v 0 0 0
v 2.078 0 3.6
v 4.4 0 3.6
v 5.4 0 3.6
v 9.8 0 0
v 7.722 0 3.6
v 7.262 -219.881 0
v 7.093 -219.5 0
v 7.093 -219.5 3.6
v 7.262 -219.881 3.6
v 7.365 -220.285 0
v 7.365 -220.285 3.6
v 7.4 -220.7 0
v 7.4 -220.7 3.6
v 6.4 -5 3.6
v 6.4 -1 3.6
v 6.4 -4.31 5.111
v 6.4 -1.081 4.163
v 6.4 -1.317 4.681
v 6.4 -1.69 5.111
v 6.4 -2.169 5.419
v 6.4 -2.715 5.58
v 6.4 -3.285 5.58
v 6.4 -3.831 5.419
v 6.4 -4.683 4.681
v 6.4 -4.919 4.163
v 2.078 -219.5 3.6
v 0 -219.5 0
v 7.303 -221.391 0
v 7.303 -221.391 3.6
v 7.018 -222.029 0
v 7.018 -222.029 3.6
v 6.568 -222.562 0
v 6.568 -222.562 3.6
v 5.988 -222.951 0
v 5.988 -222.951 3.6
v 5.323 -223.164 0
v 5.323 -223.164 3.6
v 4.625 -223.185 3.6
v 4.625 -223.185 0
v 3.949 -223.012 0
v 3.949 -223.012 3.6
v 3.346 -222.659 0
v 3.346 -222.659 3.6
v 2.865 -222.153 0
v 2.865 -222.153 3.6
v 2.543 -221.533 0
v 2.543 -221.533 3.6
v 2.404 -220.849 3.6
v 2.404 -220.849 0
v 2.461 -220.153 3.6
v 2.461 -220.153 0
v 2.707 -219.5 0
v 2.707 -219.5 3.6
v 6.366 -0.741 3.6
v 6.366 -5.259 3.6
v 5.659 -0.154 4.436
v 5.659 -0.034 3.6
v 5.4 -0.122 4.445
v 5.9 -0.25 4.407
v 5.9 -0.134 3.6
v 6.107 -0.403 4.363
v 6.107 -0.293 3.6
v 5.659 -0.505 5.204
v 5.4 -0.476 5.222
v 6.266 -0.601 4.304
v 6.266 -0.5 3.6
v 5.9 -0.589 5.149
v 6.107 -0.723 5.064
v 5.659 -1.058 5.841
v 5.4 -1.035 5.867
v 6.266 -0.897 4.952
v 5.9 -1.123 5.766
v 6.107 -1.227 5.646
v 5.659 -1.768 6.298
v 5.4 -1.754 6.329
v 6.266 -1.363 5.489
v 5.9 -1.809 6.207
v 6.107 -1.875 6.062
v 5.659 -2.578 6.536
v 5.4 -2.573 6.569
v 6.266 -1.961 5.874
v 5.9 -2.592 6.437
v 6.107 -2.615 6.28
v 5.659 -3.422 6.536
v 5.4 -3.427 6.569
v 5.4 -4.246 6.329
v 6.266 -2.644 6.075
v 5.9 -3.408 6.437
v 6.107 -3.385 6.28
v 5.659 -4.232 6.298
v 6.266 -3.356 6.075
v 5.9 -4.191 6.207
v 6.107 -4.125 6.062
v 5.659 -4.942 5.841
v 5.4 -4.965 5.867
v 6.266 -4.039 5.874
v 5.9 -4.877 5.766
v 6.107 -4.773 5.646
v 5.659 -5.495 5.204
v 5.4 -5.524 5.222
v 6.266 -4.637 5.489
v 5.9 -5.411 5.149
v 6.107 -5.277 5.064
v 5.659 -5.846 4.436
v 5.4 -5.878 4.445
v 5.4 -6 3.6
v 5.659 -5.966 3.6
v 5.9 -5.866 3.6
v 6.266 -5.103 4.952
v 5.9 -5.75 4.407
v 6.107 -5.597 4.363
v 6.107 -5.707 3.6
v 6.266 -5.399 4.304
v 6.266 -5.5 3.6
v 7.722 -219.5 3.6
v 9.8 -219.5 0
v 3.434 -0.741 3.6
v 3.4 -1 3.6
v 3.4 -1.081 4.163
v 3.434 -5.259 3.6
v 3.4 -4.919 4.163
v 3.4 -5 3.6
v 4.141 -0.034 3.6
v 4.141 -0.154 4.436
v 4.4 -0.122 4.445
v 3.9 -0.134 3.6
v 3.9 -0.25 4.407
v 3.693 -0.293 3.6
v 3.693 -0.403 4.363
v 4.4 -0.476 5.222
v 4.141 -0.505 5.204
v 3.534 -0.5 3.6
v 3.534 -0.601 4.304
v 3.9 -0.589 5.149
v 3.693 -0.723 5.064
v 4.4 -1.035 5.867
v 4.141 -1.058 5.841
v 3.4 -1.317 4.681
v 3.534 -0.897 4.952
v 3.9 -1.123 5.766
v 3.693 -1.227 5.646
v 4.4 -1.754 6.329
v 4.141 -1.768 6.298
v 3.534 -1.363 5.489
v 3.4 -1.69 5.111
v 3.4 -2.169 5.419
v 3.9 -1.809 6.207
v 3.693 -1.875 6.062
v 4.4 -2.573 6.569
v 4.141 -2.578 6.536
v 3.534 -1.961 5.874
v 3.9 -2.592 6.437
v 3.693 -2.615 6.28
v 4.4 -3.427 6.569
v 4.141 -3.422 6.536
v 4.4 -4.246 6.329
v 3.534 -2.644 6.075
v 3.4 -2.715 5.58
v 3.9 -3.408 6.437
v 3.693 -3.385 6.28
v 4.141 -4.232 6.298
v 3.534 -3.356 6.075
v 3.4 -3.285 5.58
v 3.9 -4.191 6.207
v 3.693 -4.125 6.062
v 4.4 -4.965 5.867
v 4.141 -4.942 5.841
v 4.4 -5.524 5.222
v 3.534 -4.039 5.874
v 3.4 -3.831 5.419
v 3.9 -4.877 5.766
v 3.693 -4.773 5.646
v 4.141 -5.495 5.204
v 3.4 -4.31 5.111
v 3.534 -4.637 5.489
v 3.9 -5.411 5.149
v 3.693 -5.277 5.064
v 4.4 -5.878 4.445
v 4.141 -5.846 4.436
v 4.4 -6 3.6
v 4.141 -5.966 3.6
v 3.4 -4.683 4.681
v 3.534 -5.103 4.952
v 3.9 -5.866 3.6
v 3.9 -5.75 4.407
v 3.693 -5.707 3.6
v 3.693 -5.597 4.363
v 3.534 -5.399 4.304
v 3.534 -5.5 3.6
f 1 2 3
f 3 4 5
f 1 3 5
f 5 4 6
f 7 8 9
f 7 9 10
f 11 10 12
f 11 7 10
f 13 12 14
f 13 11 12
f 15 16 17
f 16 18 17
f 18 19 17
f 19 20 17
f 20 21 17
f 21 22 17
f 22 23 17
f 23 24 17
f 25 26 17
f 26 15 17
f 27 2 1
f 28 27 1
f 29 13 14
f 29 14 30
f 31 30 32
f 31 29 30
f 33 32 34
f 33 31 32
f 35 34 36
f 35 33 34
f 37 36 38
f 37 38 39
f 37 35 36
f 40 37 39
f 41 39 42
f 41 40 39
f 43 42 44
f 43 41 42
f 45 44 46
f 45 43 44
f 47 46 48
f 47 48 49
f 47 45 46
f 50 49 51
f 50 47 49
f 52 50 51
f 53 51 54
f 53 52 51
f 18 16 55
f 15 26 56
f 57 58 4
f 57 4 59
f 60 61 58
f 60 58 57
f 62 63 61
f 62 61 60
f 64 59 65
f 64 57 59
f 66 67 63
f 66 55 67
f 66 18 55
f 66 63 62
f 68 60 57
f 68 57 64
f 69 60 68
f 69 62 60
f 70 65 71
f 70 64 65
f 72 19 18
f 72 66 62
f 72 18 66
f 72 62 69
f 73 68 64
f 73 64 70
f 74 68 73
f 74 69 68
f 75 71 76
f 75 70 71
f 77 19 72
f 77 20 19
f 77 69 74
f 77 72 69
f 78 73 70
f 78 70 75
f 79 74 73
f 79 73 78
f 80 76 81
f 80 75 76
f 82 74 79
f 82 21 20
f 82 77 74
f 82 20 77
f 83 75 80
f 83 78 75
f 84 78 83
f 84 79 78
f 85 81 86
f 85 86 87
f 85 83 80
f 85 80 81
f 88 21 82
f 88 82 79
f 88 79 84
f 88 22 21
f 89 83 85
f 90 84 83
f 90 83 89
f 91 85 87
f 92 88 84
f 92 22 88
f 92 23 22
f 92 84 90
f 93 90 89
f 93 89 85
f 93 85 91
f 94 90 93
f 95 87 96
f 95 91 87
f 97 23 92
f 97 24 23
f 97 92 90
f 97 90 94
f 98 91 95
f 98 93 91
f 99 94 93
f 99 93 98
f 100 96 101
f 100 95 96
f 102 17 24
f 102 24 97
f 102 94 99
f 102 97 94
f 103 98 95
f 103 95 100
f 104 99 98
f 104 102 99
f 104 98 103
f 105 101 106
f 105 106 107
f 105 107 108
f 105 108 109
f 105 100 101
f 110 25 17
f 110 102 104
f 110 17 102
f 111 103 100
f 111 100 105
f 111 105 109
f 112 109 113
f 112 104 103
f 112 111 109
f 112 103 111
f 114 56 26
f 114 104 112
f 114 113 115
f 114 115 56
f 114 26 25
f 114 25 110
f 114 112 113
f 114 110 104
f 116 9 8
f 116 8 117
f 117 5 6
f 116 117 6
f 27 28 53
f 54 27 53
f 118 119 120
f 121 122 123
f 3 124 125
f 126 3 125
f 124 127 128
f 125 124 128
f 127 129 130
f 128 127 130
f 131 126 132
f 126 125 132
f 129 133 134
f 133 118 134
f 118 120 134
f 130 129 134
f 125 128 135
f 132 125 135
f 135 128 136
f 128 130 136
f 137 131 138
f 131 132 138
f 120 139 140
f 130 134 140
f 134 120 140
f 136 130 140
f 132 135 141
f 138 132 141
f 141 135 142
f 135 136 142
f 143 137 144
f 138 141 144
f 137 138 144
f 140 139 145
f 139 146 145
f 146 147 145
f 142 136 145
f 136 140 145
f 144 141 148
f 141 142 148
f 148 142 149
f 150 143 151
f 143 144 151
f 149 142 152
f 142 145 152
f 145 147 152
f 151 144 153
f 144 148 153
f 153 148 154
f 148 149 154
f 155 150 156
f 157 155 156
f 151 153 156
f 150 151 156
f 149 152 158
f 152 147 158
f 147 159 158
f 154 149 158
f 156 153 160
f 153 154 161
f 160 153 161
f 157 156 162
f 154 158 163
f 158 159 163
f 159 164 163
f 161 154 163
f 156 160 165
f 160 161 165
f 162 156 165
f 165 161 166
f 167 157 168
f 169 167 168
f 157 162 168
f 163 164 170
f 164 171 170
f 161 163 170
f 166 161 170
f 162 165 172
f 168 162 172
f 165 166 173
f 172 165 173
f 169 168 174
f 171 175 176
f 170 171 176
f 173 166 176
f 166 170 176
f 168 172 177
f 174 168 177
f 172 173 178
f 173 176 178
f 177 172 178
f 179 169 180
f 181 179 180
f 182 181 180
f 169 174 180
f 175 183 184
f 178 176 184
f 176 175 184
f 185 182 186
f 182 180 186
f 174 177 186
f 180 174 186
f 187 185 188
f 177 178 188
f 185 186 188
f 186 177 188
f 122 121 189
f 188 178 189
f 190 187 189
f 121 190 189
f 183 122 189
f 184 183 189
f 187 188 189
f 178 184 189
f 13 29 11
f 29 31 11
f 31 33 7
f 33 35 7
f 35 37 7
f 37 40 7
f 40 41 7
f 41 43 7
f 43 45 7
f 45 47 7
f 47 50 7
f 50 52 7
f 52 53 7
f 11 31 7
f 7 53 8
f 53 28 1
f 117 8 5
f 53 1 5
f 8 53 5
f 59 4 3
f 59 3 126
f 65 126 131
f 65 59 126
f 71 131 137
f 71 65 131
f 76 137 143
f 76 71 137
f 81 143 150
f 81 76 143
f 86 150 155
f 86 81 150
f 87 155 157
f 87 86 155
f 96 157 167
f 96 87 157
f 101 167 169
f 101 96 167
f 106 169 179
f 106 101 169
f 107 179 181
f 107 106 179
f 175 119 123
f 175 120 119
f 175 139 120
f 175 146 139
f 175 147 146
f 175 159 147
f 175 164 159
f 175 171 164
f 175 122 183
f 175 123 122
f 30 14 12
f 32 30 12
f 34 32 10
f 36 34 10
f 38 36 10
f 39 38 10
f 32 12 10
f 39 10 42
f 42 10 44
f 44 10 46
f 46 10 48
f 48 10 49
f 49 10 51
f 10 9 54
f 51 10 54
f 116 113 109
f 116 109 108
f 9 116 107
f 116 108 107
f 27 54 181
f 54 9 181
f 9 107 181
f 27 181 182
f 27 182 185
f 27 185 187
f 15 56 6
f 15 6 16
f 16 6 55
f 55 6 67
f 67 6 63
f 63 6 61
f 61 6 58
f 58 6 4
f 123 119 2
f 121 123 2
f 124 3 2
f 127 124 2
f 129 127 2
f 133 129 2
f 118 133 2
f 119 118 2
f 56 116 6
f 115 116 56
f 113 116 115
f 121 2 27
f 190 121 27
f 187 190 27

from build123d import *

# Parameters (mm, degrees)
F1_DEPTH = 219.5
F3_DEPTH = 3.6
F6_W     = 3
F6_H     = 3
F7_ANGLE = 180
F8_R     = 1


with BuildPart() as f1:
    # F0 (on Front) → F1 (new body)
    with BuildSketch(Plane.XZ):
        Polygon((2.0784609691, 3.6), (0, 0), (9.8, 0), (7.7215390309, 3.6), align=None)
    extrude(amount=F1_DEPTH)

    # F2 (on face) → F3 (join)
    with BuildSketch(Plane(origin=(0, 0, 0), x_dir=(1, 0, 0), z_dir=(0, 0, -1))):
        with BuildLine():
            ThreePointArc((7.0931712199, 219.5), (7.3220784514, 220.0806971863), (7.4, 220.7))
            ThreePointArc((7.4, 220.7), (4.2806971863, 223.1220784514), (2.7068287801, 219.5))
            Line((2.7068287801, 219.5), (7.0931712199, 219.5))
        make_face()
    extrude(amount=-F3_DEPTH)


with BuildPart() as f4_1:
    # F4: copy of F1
    add(f1.part)

    # F6 (on face) → F7 (revolve)
    with BuildSketch(Plane.XY.offset(3.6)):
        with Locations((4.9, -1.5)):
            Rectangle(F6_W, F6_H)
    revolve(axis=Axis((4.9, -3, 3.6), (1, 0, 0)), revolution_arc=F7_ANGLE)

    # F8
    f8_edges = [f4_1.edges().sort_by_distance(p)[0] for p in [
        (6.4, -3, 6.6),
        (3.4, -3, 6.6),
    ]]
    fillet(f8_edges, radius=F8_R)


solid = f4_1.part
